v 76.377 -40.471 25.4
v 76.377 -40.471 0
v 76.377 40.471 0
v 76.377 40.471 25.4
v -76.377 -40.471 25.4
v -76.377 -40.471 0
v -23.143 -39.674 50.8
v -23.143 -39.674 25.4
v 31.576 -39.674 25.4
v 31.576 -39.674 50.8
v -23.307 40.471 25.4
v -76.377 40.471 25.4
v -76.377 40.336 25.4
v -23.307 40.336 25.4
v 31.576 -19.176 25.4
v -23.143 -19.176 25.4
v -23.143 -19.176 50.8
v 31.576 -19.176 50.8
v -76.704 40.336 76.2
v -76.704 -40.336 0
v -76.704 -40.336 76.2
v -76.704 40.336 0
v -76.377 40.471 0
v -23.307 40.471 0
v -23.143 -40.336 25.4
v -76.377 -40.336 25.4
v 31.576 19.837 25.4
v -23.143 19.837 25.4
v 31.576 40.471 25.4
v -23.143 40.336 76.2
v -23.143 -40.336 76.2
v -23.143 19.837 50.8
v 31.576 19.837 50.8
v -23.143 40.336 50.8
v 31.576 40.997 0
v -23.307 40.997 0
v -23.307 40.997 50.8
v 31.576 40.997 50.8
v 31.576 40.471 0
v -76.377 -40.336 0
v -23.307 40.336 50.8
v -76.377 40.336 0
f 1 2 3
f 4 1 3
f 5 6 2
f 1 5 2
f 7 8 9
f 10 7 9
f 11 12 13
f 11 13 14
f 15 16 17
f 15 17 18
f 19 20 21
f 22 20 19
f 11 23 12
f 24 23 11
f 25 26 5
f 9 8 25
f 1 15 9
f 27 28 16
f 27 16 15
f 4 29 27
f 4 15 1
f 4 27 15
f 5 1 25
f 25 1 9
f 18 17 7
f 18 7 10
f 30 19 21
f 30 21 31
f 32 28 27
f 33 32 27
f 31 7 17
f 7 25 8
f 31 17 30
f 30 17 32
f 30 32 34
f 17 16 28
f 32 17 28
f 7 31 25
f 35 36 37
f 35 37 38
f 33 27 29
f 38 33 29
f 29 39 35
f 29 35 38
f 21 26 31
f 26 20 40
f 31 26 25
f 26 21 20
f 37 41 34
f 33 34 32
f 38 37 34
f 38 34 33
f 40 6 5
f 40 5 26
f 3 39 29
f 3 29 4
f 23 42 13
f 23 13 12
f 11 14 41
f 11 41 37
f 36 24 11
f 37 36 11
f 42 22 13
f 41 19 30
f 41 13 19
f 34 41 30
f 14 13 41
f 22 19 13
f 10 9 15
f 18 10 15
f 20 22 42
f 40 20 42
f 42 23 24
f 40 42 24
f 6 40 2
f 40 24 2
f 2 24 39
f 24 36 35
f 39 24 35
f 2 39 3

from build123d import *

# Parameters (mm, degrees)
F0_W     = 152.754978
F0_H     = 80.941722
F1_DEPTH = 25.4
F2_W     = 53.560414
F2_H     = 80.67124
F3_DEPTH = 76.2
F4_W     = 54.882895
F4_H     = 20.498429
F4_H_2   = 21.159672
F5_DEPTH = 50.8


with BuildPart() as f1:
    # F0 (on Top) → F1 (new body)
    with BuildSketch(Plane.XY):
        Rectangle(F0_W, F0_H)
    extrude(amount=F1_DEPTH)

    # F2 (on Top) → F3 (join)
    with BuildSketch(Plane.XY):
        with Locations((-49.923595, -2e-06)):
            Rectangle(F2_W, F2_H)
    extrude(amount=F3_DEPTH)

    # F4 (on Top) → F5 (join)
    with BuildSketch(Plane.XY):
        with Locations((4.134902, -29.425164)):
            Rectangle(F4_W, F4_H)
        with Locations((4.134902, 30.417025)):
            Rectangle(F4_W, F4_H_2)
    extrude(amount=F5_DEPTH)


solid = f1.part
